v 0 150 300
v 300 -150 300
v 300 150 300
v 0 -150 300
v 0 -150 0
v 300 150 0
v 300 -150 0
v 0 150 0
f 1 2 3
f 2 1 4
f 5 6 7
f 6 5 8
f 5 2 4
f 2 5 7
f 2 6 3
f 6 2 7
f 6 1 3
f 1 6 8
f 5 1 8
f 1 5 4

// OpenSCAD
// A 300 mm cube resting on z = 0, its nose at x = 0.
translate([0, -150, 0])
    cube(300);
